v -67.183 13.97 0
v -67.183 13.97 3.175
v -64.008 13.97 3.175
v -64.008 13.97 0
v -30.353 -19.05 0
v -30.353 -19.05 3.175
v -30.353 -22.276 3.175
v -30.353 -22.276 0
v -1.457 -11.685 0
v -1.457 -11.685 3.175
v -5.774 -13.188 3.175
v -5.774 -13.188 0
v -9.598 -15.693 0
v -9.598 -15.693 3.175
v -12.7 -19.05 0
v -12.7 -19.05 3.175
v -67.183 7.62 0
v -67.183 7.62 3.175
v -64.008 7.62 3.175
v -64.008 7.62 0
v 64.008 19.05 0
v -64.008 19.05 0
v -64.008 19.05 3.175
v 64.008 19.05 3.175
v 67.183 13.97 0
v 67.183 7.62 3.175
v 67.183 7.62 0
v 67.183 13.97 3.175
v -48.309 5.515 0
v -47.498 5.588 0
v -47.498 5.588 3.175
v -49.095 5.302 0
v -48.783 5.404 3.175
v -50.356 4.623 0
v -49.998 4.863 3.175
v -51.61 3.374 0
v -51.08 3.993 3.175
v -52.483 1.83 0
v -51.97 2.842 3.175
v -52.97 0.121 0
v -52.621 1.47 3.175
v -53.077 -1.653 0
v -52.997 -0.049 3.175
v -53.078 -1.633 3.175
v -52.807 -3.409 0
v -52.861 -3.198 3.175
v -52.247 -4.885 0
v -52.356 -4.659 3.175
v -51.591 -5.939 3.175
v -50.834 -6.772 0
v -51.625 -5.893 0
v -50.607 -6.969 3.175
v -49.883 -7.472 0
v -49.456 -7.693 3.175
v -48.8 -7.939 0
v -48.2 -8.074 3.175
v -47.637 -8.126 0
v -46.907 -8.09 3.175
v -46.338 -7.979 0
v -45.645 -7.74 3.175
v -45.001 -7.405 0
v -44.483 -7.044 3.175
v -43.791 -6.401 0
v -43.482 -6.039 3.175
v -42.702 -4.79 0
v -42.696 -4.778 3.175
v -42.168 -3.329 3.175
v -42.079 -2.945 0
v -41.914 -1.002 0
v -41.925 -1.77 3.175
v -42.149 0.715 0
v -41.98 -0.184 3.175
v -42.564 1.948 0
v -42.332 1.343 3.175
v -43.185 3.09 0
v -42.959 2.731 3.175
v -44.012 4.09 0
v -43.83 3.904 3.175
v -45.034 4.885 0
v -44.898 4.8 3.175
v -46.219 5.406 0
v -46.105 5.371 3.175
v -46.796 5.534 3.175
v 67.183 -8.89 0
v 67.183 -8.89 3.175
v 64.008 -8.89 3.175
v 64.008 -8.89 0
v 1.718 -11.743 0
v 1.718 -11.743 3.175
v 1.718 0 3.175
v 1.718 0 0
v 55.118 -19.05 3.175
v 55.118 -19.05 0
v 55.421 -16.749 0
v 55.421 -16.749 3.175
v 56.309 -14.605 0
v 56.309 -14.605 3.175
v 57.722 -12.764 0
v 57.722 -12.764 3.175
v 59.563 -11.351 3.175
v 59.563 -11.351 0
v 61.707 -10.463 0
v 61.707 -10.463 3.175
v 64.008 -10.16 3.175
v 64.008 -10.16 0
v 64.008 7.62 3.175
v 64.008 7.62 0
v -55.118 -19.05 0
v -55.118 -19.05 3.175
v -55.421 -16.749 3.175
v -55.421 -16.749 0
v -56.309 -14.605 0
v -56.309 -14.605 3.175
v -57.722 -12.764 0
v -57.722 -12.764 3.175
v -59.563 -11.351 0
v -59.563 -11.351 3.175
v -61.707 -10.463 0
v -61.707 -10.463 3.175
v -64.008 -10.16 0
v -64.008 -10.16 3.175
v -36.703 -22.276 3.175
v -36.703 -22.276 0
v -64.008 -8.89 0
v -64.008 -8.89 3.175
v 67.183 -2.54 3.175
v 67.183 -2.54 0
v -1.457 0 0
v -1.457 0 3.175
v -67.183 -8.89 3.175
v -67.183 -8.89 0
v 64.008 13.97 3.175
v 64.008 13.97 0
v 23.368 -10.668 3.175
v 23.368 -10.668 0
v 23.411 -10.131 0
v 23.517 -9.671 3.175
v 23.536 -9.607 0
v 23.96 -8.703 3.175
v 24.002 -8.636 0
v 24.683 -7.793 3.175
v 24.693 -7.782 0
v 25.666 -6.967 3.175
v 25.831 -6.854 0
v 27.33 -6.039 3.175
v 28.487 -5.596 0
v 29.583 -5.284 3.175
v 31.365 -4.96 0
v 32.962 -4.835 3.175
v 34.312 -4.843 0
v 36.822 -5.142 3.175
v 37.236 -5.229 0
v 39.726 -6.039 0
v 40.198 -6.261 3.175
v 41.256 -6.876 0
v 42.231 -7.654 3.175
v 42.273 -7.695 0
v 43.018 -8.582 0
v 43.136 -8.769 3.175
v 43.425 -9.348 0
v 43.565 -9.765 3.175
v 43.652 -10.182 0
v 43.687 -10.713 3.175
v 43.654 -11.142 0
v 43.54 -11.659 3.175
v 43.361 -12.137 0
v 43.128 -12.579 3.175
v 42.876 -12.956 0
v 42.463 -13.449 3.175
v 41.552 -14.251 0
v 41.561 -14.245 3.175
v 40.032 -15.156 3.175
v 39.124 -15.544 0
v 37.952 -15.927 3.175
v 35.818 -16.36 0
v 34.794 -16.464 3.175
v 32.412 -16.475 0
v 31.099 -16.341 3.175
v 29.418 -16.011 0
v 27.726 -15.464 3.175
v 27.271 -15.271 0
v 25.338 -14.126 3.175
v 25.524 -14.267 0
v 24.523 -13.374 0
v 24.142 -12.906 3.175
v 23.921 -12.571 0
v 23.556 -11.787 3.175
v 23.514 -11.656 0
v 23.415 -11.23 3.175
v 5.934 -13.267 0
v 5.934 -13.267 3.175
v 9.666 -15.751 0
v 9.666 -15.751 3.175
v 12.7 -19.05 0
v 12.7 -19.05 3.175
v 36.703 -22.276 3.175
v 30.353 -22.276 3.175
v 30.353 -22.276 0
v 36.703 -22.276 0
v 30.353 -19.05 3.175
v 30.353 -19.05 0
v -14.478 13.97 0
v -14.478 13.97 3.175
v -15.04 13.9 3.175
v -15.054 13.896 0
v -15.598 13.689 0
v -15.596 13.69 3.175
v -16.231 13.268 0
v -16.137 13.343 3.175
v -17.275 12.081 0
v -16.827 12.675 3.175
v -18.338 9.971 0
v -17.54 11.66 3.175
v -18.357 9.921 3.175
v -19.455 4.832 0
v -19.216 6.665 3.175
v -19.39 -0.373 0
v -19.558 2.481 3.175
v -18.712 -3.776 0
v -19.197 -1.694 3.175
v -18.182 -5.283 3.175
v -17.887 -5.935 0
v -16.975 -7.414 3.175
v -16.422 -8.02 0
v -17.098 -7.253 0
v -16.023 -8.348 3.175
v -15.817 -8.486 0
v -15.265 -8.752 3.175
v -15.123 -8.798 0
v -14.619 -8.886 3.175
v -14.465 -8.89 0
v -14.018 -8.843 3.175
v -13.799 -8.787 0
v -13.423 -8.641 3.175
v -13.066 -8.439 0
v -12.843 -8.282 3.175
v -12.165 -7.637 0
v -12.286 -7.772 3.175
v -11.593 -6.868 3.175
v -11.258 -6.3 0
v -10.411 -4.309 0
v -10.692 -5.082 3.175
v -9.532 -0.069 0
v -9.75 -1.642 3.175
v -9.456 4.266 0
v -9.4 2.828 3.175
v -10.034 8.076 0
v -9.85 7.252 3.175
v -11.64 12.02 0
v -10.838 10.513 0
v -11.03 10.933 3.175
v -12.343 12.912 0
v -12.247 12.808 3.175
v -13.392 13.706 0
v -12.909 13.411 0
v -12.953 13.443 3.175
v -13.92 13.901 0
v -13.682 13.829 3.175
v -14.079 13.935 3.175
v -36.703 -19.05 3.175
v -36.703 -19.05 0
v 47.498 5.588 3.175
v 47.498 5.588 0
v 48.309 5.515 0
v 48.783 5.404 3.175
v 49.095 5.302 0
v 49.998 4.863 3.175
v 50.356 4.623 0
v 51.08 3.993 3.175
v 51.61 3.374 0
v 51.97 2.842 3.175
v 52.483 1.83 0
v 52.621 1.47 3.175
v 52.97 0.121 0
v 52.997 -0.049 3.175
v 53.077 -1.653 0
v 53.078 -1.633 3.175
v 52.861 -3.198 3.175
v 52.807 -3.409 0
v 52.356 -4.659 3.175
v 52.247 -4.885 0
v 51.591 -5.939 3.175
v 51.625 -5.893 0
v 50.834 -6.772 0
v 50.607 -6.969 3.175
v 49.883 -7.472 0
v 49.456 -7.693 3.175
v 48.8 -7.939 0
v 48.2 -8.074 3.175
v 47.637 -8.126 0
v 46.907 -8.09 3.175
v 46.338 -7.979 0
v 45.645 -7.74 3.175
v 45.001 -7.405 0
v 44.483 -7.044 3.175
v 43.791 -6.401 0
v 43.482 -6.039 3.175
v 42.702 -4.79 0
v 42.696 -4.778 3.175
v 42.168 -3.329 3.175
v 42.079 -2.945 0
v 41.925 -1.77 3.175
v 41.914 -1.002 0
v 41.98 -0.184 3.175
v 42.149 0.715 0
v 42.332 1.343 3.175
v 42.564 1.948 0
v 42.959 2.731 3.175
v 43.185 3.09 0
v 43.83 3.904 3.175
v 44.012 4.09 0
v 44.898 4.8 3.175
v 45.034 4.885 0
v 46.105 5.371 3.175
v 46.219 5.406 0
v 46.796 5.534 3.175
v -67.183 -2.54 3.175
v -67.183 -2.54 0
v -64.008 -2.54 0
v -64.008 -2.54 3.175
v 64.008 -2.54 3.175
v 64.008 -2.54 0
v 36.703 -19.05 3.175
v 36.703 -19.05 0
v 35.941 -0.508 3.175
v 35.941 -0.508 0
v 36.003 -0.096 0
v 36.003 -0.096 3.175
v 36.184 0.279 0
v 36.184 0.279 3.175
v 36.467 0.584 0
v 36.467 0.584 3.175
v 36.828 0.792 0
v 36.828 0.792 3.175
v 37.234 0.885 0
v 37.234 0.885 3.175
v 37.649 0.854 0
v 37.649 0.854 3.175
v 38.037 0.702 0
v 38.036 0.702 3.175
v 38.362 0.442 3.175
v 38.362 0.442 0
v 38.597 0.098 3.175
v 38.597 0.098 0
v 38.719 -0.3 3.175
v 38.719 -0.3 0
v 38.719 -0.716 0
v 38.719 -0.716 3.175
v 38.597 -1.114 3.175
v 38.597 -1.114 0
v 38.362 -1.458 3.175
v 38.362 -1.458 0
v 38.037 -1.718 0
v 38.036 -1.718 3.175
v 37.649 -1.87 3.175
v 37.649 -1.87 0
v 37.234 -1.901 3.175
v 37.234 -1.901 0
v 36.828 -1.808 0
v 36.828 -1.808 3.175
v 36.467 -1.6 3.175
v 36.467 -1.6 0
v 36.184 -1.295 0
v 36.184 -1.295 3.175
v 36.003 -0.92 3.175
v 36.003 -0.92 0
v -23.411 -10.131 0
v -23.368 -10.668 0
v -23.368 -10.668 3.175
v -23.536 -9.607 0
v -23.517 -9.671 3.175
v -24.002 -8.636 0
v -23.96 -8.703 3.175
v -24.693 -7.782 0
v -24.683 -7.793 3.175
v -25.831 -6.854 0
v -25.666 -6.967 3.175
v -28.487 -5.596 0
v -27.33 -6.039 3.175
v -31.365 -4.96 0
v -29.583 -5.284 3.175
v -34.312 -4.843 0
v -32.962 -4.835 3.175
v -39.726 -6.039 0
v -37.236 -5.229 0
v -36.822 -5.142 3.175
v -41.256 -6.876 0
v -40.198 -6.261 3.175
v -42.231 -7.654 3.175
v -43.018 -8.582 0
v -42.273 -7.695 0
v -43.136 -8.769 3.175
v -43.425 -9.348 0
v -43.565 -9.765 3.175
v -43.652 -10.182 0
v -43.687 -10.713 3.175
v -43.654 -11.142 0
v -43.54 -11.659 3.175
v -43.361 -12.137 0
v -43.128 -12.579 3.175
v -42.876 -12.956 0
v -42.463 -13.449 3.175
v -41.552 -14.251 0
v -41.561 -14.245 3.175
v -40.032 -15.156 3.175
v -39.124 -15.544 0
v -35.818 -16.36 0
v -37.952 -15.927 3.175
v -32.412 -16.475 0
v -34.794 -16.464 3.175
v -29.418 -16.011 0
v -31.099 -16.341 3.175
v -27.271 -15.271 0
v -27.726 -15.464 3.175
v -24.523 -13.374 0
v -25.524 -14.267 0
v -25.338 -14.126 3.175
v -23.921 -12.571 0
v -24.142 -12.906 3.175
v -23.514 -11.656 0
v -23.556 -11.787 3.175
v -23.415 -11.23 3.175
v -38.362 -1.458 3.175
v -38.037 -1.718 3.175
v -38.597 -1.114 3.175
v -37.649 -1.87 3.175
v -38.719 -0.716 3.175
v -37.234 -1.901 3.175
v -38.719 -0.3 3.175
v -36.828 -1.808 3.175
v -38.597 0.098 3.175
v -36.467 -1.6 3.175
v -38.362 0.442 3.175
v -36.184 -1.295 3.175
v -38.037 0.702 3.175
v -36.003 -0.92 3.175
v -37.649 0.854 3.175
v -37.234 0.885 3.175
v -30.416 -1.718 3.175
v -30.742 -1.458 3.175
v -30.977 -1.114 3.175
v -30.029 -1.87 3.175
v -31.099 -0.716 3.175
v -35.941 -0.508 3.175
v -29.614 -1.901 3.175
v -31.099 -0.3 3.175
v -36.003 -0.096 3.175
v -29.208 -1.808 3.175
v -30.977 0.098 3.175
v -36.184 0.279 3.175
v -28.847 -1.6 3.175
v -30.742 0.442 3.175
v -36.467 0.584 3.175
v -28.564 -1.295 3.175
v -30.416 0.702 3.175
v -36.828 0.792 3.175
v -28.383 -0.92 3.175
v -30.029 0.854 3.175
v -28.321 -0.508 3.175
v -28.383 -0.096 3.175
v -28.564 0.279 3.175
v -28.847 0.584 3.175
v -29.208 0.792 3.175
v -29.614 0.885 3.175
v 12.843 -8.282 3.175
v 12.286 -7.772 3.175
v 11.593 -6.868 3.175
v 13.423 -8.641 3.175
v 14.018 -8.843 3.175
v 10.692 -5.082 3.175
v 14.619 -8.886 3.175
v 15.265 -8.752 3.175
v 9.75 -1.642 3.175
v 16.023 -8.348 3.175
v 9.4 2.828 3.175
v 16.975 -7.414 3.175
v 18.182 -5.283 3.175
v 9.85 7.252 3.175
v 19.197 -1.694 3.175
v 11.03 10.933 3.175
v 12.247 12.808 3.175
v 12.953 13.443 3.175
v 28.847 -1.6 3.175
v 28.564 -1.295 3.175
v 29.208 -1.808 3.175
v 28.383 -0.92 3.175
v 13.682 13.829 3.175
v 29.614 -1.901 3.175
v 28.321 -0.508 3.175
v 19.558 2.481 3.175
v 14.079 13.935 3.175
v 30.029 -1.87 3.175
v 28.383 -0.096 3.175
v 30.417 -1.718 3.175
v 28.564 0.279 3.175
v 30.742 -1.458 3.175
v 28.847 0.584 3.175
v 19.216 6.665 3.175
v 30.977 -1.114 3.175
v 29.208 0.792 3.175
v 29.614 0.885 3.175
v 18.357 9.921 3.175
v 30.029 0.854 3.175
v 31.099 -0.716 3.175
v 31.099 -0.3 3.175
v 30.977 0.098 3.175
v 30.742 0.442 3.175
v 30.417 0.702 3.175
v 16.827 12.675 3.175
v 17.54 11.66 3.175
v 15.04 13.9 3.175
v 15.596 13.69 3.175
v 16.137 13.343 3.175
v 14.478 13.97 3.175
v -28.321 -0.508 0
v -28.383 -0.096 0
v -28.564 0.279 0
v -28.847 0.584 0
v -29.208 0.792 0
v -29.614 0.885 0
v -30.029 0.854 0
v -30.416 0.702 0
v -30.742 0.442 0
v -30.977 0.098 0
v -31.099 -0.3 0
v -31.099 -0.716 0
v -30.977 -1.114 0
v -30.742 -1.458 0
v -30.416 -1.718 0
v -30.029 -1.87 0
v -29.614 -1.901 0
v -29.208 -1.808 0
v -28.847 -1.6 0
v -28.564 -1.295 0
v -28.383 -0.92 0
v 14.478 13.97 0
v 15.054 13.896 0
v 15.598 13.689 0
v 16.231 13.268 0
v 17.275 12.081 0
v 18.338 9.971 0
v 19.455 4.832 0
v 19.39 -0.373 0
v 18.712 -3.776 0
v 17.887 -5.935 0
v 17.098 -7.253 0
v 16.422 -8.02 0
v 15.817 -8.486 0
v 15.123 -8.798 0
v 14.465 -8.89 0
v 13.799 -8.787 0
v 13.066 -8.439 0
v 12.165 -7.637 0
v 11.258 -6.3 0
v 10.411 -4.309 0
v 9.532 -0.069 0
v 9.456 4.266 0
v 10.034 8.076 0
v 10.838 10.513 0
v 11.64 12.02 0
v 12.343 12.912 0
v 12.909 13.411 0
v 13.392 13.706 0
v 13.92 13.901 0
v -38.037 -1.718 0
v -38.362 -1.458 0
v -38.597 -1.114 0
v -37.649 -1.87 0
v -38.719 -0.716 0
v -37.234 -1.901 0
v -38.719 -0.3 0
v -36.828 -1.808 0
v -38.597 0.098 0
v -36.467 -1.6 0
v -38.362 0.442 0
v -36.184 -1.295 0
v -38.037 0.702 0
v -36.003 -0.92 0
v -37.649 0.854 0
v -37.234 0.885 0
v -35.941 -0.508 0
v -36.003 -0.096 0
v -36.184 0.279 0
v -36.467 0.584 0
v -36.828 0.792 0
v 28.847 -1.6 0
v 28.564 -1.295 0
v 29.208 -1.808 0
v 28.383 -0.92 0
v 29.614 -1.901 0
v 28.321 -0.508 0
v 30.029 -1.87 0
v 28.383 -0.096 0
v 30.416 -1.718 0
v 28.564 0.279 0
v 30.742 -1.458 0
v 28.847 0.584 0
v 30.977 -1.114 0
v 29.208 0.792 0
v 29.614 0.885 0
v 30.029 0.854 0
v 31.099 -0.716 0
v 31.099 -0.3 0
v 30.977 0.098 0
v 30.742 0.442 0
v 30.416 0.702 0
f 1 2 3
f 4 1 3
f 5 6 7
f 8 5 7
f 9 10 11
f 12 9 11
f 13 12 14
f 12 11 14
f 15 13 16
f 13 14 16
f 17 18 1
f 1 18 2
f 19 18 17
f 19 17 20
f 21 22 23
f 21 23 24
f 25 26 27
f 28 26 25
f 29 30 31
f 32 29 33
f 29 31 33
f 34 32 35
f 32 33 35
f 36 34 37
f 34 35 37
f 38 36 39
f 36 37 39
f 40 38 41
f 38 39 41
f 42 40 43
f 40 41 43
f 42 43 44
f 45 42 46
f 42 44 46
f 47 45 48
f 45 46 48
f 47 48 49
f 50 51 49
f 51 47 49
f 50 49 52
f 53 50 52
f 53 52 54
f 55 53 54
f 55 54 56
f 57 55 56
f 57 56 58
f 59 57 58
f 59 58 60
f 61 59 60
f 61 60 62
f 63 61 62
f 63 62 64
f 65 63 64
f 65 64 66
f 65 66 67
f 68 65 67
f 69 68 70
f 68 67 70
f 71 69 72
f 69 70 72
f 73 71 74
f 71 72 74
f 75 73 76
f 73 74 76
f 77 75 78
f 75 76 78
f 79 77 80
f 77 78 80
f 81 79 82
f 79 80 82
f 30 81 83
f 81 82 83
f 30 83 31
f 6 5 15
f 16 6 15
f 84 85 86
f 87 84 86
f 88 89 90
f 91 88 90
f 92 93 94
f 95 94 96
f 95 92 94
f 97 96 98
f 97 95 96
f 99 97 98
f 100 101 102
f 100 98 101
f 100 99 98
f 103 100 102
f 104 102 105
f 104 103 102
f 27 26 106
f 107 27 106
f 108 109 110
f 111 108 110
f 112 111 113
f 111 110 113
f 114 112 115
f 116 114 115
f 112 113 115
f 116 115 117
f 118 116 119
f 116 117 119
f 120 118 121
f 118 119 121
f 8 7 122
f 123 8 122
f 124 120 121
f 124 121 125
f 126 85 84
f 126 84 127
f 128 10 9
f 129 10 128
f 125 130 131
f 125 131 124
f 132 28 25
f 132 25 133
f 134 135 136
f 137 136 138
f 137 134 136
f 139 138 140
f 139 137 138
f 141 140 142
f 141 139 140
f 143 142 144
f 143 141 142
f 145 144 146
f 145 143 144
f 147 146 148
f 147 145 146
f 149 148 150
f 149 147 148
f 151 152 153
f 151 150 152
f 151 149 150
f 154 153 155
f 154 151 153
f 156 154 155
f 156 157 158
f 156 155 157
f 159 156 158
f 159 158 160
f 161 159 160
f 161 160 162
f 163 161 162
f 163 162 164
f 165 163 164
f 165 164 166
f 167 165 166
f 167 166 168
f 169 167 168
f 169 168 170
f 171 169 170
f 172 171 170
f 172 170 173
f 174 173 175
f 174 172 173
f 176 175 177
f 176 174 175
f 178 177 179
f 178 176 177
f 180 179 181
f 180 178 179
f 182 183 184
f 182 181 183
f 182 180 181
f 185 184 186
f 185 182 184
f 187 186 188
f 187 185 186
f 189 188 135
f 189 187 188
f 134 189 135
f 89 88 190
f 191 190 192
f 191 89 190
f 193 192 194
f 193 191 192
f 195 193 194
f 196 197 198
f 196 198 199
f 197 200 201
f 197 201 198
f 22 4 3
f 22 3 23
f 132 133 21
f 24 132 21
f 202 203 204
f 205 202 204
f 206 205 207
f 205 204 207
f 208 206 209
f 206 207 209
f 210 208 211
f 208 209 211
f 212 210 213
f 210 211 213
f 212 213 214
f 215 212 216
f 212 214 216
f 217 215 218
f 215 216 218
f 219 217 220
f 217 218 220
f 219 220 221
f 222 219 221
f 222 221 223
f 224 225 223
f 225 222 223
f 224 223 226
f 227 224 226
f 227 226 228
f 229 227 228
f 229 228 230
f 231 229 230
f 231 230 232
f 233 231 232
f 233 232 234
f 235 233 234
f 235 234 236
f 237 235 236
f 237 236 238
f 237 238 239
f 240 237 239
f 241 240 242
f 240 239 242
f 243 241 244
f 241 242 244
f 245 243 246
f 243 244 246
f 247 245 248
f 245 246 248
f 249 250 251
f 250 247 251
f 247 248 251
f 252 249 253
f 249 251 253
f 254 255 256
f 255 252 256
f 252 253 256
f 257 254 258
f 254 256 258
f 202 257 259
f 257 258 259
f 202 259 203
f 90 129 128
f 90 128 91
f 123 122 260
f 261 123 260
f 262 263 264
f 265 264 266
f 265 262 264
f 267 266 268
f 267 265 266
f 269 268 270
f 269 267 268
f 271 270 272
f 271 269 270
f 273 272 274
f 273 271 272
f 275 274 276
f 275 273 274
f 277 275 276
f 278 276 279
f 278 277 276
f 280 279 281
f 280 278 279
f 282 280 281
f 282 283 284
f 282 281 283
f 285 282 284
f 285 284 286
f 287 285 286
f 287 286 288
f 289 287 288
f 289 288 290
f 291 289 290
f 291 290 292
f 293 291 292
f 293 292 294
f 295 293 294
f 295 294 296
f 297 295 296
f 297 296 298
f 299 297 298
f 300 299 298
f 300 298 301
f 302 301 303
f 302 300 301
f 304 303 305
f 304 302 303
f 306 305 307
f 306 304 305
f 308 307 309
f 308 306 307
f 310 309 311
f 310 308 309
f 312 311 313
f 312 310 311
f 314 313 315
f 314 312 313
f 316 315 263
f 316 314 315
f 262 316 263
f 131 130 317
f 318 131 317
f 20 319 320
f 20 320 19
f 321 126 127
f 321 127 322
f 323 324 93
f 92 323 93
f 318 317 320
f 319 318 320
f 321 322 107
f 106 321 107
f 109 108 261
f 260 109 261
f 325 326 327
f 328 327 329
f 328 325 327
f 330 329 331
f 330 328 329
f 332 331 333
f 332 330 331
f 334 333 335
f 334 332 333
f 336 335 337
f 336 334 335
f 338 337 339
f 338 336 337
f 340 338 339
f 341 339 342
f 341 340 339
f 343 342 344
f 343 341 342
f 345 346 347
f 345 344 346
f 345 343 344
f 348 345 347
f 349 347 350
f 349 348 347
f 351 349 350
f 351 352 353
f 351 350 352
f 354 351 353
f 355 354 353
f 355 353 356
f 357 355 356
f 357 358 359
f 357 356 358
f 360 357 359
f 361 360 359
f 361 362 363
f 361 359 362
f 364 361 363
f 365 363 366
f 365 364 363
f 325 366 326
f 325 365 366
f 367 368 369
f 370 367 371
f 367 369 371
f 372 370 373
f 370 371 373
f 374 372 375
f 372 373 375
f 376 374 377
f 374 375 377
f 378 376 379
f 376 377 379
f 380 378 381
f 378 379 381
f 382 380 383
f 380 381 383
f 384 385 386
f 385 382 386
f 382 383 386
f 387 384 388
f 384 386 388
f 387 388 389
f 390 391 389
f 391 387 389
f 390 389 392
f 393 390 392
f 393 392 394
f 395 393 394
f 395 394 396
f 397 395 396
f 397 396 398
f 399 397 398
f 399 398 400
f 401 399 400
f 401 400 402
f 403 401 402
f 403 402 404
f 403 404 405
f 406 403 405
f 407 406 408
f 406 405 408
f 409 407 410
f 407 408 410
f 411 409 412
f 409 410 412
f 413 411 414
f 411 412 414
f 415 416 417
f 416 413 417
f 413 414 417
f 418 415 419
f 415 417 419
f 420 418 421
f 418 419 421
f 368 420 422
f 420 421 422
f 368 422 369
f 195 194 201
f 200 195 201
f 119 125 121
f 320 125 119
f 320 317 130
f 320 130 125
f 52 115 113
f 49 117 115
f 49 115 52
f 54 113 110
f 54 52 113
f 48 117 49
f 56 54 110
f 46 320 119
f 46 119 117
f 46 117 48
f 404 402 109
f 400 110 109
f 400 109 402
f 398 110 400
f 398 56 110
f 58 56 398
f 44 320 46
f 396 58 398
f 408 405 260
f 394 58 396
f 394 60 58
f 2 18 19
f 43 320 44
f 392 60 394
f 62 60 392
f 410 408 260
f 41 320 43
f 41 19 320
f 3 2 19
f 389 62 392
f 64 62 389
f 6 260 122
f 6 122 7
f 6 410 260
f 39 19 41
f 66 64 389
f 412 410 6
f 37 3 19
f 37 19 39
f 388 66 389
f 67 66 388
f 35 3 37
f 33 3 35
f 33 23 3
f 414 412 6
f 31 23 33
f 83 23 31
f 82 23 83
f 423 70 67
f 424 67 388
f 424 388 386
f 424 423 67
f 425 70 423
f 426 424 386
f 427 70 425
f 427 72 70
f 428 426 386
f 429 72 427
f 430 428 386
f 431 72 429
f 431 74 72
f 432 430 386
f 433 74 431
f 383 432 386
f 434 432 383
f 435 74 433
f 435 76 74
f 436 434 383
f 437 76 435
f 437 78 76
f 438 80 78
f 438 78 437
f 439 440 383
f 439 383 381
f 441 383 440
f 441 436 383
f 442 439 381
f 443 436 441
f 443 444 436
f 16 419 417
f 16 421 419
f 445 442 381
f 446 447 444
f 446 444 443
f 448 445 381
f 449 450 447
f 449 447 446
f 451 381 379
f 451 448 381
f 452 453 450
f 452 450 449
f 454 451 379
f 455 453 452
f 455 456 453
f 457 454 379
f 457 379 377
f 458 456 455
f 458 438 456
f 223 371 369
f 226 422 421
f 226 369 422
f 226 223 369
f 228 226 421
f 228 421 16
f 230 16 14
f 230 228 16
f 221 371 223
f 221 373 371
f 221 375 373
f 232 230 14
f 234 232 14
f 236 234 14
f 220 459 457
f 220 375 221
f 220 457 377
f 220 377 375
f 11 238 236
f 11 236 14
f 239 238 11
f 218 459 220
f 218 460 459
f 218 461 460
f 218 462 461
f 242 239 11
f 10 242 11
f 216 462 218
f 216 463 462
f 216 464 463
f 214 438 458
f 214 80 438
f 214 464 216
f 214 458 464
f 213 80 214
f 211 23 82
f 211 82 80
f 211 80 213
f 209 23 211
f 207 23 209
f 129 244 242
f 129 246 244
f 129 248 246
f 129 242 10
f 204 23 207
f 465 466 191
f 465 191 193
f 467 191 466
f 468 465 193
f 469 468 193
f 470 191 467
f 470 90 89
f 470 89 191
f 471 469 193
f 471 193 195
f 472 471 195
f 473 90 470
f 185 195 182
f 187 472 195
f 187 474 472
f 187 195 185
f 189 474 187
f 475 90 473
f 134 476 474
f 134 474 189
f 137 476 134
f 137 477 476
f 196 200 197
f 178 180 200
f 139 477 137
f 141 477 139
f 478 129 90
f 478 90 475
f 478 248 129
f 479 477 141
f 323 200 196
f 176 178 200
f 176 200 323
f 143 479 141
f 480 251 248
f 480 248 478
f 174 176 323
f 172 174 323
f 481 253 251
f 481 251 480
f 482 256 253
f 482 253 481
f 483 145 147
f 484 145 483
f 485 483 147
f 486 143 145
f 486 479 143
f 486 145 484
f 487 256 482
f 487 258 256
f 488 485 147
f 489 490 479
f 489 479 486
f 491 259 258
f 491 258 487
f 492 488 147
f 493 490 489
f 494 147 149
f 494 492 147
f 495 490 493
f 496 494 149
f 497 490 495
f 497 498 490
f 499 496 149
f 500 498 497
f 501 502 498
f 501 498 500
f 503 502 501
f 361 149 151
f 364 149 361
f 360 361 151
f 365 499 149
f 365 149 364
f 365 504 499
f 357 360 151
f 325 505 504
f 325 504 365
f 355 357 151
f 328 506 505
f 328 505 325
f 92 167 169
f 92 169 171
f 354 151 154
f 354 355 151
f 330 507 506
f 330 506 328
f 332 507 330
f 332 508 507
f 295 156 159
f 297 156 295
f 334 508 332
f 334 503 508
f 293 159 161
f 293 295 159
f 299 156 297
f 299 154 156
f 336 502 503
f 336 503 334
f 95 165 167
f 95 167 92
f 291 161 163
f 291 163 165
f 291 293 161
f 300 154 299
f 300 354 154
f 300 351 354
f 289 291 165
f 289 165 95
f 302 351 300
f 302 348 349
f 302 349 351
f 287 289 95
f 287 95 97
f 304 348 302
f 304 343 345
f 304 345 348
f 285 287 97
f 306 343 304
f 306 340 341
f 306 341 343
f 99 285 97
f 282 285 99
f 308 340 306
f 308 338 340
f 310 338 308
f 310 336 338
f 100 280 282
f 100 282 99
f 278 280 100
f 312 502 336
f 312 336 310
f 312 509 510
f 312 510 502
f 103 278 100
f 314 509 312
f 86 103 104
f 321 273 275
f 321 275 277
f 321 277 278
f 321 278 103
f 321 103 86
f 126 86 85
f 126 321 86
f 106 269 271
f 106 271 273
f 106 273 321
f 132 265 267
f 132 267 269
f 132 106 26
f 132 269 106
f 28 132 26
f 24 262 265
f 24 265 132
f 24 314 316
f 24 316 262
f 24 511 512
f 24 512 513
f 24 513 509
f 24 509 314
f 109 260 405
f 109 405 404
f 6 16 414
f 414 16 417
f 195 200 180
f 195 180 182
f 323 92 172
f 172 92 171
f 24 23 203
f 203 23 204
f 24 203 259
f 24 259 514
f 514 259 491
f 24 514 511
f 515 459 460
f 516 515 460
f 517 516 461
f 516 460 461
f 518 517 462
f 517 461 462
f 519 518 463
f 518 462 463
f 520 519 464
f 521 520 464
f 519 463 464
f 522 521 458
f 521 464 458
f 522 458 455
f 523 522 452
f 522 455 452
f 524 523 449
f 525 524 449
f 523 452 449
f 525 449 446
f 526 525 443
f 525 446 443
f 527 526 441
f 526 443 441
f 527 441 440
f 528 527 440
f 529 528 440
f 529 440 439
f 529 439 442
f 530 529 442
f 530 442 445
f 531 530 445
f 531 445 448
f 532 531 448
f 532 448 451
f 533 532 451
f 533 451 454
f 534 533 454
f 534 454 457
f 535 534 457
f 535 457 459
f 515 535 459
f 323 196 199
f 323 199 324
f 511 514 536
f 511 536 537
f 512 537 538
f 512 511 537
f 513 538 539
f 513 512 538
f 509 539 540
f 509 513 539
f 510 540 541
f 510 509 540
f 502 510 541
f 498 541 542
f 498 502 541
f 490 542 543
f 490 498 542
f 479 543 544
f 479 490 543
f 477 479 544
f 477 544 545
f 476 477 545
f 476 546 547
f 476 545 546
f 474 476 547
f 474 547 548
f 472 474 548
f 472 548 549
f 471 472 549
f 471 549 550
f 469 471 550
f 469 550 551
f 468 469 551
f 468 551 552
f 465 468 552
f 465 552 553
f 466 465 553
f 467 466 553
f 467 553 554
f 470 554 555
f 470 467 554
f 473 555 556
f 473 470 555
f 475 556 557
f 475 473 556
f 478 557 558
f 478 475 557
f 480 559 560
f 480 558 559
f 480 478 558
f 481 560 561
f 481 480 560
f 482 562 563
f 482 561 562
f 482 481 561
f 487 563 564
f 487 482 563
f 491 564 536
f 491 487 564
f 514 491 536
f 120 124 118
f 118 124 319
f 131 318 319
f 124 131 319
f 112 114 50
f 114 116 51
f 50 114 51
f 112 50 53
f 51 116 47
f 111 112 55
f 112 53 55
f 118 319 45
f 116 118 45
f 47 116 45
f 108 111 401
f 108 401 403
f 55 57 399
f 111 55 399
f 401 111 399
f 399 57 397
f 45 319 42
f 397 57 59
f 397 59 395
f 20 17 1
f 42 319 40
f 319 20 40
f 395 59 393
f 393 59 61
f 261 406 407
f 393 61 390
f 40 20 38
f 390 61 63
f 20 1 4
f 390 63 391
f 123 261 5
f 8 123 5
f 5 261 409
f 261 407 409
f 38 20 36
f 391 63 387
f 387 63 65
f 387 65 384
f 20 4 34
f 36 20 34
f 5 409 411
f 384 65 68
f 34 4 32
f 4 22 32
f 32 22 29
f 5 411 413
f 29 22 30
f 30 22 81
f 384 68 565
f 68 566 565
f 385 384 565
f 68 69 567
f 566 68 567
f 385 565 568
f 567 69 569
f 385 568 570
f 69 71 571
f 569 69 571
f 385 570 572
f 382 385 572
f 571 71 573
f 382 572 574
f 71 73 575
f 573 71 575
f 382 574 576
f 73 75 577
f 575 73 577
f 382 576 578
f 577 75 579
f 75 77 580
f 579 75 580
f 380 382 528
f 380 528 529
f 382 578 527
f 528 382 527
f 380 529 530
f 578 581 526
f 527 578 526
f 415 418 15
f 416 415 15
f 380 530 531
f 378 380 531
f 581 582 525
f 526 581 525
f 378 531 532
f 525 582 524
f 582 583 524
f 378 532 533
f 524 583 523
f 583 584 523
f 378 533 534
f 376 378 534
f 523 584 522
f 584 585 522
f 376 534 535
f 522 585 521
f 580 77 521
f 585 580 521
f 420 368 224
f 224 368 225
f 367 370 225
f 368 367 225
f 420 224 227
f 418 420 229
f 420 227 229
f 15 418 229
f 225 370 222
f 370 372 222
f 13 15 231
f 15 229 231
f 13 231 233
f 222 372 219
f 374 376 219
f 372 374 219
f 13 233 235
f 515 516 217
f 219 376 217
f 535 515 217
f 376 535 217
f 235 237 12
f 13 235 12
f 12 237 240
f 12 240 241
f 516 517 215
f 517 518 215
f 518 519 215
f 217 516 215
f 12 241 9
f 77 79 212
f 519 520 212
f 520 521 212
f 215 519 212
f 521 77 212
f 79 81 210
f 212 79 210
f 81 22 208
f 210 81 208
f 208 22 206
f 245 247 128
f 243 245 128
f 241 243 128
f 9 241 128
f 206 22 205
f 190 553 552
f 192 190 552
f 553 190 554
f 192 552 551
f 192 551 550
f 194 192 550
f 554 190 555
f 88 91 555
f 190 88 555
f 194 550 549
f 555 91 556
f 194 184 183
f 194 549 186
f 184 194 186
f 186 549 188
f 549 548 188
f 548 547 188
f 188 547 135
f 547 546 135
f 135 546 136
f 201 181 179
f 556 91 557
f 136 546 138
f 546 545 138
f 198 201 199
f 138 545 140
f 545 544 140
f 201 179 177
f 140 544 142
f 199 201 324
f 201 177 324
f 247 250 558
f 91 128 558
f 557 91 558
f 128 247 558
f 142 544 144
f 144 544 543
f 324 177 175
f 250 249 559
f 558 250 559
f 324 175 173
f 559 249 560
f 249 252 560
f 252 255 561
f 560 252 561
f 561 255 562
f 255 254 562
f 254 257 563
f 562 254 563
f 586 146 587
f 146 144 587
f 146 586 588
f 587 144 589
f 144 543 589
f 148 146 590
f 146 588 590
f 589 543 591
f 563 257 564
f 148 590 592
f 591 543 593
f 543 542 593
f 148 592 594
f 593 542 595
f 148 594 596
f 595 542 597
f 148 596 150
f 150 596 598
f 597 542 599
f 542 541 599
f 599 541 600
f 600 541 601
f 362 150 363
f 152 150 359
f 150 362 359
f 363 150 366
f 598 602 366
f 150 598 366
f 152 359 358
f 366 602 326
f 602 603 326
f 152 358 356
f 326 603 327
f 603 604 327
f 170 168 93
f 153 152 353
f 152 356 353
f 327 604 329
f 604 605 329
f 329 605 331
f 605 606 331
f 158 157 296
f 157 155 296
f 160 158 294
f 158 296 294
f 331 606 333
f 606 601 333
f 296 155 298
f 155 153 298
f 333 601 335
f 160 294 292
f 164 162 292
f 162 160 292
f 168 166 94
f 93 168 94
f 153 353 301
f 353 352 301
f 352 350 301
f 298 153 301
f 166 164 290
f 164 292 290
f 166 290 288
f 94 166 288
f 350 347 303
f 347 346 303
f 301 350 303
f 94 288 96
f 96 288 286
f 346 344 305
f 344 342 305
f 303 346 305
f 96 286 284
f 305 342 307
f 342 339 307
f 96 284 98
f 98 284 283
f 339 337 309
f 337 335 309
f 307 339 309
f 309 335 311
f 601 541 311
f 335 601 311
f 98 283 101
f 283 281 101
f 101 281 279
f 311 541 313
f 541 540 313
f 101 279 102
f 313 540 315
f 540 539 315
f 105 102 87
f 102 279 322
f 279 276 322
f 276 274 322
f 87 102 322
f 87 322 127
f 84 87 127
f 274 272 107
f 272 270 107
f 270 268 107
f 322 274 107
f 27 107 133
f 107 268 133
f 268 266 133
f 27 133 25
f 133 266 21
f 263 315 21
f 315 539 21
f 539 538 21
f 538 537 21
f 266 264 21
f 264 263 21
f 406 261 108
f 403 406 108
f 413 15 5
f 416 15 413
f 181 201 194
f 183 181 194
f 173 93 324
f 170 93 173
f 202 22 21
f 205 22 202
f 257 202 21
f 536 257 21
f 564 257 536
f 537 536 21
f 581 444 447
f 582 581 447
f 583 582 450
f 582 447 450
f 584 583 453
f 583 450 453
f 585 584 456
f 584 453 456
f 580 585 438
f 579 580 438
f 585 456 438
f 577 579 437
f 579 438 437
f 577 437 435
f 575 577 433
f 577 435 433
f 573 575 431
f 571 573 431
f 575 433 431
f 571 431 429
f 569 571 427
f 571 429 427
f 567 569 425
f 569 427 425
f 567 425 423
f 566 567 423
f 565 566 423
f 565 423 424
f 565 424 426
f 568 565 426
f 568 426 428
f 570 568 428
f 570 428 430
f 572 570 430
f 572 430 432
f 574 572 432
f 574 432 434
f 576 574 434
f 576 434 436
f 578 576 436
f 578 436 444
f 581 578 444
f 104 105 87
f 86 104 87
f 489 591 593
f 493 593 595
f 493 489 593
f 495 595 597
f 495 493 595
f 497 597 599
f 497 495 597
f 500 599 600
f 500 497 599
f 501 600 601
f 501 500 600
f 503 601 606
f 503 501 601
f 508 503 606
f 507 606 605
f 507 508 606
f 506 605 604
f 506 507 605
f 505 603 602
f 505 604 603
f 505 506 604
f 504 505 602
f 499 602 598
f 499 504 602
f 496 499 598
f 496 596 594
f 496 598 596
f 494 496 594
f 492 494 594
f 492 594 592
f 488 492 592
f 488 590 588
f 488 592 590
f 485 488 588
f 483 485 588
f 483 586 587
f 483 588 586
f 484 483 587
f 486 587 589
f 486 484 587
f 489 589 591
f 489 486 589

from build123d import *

# Parameters (mm, degrees)
SKETCH1_W                         = 128.016
SKETCH1_H                         = 38.1
MAIN_BODY_DEPTH                   = 3.175
SKETCH2_R                         = 1.397
UBRACKET_HOLES_DEPTH              = 4.175
SKETCH3_W                         = 3.175
SKETCH3_H                         = 6.35
TABS_DEPTH                        = 3.175
SKETCH4_RX                        = 11.43
SKETCH4_RY                        = 5.08
SKETCH4_RX_2                      = 10.16
SKETCH4_RY_2                      = 5.842
SKETCH4_RX_3                      = 6.858
SKETCH4_RY_3                      = 5.588
HOLES_FOR_CONTROL_ARMS_DEPTH      = 4.175
SKETCH5_W                         = 3.175
SKETCH5_H                         = 19.05
SLOT_FOR_NOSE_PANEL_DEPTH         = 4.1750001
CUT_CORNER_FOR_SCREW_ACCESS_DEPTH = 4.1750001


with BuildPart() as part:
    # Sketch1 → main body (new body)
    with BuildSketch(Plane.XY):
        Rectangle(SKETCH1_W, SKETCH1_H)
    extrude(amount=MAIN_BODY_DEPTH)

    # Sketch2 → ubracket holes (cut, through all)
    with BuildSketch(Plane.XY.offset(3.175)):
        with Locations((-29.718, -0.508)):
            Circle(SKETCH2_R)
        with Locations((-37.338, -0.508)):
            Circle(SKETCH2_R)
    ubracket_holes = extrude(amount=-UBRACKET_HOLES_DEPTH, mode=Mode.SUBTRACT)

    # Sketch3 → tabs (add)
    with BuildSketch(Plane.XY.offset(3.175)):
        with Locations((-65.5955, 10.795)):
            Rectangle(SKETCH3_W, SKETCH3_H)
        with Locations((-65.5955, -5.715)):
            Rectangle(SKETCH3_W, SKETCH3_H)
        Polygon((-33.528, -19.05), (-30.353, -19.05), (-30.353, -22.2758), (-36.703, -22.2758), (-36.703, -19.05), align=None)
    tabs = extrude(amount=-TABS_DEPTH)

    # Sketch4 → holes for control arms (cut, through all)
    with BuildSketch(Plane.XY.offset(3.175)):
        with Locations(Location((-14.478, 2.54), (0, 0, 90))):
            Ellipse(SKETCH4_RX, SKETCH4_RY)
        with Locations((-33.527531332, -10.668)):
            Ellipse(SKETCH4_RX_2, SKETCH4_RY_2)
        with Locations(Location((-47.498, -1.27), (0, 0, 90))):
            Ellipse(SKETCH4_RX_3, SKETCH4_RY_3)
    holes_for_control_arms = extrude(amount=-HOLES_FOR_CONTROL_ARMS_DEPTH, mode=Mode.SUBTRACT)

    # mirror of ubracket holes: ubracket holes across plane
    add(ubracket_holes.mirror(Plane(origin=(0, 0, 0), x_dir=(0, 0, 1), z_dir=(1, 0, 0))), mode=Mode.SUBTRACT)

    # mirror of tabs: tabs across plane
    add(tabs.mirror(Plane(origin=(0, 0, 0), x_dir=(0, 0, 1), z_dir=(1, 0, 0))))

    # Mirror3: holes for control arms across plane
    add(holes_for_control_arms.mirror(Plane(origin=(0, 0, 0), x_dir=(0, 0, 1), z_dir=(1, 0, 0))), mode=Mode.SUBTRACT)

    # Sketch5 → slot for nose panel (cut, through all)
    with BuildSketch(Plane.XY.offset(3.175)):
        with Locations((0.130633012, -9.525)):
            Rectangle(SKETCH5_W, SKETCH5_H)
    extrude(amount=-SLOT_FOR_NOSE_PANEL_DEPTH, mode=Mode.SUBTRACT)

    # Sketch6 → cut corner for screw access (cut, through all)
    with BuildSketch(Plane.XY.offset(3.175)):
        with BuildLine():
            Line((0, -19.05), (0, -11.43))
            ThreePointArc((0, -11.43), (-7.135959689, -13.930067184), (-12.7, -19.05))
            Line((-12.7, -19.05), (0, -19.05))
        make_face()
        with BuildLine():
            Line((-64.008, -19.05), (-55.118, -19.05))
            ThreePointArc((-55.118, -19.05), (-57.721820715, -12.763820715), (-64.008, -10.16))
            Line((-64.008, -10.16), (-64.008, -19.05))
        make_face()
    cut_corner_for_screw_access = extrude(amount=-CUT_CORNER_FOR_SCREW_ACCESS_DEPTH, mode=Mode.SUBTRACT)

    # Mirror4: cut corner for screw access across plane
    add(cut_corner_for_screw_access.mirror(Plane(origin=(0, 0, 0), x_dir=(0, 0, 1), z_dir=(1, 0, 0))), mode=Mode.SUBTRACT)


solid = part.part
